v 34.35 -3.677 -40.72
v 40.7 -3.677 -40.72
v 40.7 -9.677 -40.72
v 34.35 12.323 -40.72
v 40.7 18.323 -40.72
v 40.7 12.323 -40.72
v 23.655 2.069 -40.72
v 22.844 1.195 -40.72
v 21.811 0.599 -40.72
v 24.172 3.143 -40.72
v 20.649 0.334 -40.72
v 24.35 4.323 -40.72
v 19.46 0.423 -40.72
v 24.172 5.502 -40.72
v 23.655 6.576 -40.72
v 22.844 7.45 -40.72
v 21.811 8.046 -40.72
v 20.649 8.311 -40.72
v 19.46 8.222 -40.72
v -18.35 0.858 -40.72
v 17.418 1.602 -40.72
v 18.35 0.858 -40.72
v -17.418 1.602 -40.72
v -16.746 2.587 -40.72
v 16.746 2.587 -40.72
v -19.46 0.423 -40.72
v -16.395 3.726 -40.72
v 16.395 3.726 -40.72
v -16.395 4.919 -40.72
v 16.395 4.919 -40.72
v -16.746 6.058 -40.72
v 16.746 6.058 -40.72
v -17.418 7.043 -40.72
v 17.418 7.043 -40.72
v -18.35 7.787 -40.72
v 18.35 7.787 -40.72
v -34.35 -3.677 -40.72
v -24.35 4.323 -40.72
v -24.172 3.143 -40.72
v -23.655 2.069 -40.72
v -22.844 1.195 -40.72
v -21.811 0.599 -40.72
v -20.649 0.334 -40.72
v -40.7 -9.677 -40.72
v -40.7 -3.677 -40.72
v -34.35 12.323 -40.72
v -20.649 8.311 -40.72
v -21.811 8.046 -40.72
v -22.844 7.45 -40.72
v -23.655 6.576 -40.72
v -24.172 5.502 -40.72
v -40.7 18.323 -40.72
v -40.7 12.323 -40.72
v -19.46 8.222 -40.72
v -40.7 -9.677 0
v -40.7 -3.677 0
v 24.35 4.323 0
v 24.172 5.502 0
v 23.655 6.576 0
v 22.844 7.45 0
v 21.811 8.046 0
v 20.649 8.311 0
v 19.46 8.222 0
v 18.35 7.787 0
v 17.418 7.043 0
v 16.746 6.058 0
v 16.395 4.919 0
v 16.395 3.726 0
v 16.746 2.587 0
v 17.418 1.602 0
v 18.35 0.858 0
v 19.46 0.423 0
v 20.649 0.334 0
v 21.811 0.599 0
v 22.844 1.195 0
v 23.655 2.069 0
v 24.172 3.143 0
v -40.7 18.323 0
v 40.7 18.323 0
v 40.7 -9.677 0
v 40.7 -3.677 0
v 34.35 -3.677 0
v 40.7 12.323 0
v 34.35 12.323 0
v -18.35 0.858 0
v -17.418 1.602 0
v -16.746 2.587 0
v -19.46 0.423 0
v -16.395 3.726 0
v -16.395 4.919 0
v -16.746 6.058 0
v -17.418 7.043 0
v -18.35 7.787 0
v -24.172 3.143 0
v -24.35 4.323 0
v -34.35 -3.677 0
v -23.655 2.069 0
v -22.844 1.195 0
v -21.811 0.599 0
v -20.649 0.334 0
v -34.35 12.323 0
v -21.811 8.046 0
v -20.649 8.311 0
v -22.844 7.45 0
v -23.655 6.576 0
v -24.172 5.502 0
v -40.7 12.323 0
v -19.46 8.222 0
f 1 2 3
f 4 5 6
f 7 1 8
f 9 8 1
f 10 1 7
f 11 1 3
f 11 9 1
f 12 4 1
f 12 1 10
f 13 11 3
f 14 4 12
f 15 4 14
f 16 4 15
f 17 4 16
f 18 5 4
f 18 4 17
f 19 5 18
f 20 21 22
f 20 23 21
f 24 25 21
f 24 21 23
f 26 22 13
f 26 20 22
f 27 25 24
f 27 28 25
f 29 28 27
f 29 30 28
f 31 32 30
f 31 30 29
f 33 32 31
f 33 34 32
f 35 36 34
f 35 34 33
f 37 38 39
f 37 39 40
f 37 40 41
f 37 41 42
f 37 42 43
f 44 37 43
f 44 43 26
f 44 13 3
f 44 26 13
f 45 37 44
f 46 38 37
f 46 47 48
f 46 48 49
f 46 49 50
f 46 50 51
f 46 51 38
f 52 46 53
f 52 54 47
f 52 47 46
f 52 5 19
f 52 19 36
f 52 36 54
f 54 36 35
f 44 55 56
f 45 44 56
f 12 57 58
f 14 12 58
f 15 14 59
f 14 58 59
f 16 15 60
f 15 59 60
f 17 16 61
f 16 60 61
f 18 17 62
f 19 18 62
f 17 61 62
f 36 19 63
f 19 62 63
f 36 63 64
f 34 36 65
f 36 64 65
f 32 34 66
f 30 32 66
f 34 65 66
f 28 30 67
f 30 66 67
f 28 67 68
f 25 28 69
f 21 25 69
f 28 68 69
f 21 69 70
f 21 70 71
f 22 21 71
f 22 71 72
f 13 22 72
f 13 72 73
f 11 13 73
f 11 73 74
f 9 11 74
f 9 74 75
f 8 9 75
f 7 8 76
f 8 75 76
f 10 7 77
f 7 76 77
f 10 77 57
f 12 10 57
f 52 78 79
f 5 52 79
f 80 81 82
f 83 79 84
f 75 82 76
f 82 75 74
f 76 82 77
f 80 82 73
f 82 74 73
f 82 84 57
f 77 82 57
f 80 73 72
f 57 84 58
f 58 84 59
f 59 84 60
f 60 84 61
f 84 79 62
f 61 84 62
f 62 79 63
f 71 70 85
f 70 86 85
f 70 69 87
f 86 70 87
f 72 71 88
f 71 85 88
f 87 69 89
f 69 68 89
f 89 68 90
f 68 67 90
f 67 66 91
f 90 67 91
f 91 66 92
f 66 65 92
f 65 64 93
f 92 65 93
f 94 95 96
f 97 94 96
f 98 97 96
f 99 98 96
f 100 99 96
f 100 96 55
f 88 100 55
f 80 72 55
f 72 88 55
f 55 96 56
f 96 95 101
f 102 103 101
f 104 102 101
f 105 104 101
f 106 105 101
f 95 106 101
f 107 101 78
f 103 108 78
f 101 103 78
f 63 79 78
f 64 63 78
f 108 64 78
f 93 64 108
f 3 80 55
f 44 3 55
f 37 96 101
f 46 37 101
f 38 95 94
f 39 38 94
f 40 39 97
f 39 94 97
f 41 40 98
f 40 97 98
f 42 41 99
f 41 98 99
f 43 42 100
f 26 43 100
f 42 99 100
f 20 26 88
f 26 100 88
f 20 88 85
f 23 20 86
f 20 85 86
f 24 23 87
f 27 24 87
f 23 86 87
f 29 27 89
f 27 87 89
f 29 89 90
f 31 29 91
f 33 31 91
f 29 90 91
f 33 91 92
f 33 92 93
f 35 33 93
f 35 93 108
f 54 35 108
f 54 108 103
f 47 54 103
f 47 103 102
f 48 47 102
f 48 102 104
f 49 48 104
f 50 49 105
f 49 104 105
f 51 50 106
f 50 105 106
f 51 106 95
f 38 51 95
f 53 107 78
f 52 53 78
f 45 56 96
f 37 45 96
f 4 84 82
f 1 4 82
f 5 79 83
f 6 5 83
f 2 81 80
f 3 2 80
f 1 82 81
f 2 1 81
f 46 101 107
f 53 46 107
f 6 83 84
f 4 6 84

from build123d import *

# Parameters (mm, degrees)
SKETCH1_R           = 4
BOSS_EXTRUDE1_DEPTH = 40.72


with BuildPart() as part:
    # Sketch1 → Boss-Extrude1 (new body)
    with BuildSketch(Plane.XY):
        Polygon((40.7, -3.677490775), (40.7, -9.677490775), (-40.7, -9.677490775), (-40.7, -3.677490775), (-34.35, -3.677490775), (-34.35, 12.322509225), (-40.7, 12.322509225), (-40.7, 18.322509225), (40.7, 18.322509225), (40.7, 12.322509225), (34.35, 12.322509225), (34.35, -3.677490775), align=None)
        with Locations((20.35, 4.322509225)):
            Circle(SKETCH1_R, mode=Mode.SUBTRACT)
        with Locations(Location((-20.35, 4.322509225, 0), (0, 0, 180))):
            Circle(SKETCH1_R, mode=Mode.SUBTRACT)
    extrude(amount=-BOSS_EXTRUDE1_DEPTH)


solid = part.part
